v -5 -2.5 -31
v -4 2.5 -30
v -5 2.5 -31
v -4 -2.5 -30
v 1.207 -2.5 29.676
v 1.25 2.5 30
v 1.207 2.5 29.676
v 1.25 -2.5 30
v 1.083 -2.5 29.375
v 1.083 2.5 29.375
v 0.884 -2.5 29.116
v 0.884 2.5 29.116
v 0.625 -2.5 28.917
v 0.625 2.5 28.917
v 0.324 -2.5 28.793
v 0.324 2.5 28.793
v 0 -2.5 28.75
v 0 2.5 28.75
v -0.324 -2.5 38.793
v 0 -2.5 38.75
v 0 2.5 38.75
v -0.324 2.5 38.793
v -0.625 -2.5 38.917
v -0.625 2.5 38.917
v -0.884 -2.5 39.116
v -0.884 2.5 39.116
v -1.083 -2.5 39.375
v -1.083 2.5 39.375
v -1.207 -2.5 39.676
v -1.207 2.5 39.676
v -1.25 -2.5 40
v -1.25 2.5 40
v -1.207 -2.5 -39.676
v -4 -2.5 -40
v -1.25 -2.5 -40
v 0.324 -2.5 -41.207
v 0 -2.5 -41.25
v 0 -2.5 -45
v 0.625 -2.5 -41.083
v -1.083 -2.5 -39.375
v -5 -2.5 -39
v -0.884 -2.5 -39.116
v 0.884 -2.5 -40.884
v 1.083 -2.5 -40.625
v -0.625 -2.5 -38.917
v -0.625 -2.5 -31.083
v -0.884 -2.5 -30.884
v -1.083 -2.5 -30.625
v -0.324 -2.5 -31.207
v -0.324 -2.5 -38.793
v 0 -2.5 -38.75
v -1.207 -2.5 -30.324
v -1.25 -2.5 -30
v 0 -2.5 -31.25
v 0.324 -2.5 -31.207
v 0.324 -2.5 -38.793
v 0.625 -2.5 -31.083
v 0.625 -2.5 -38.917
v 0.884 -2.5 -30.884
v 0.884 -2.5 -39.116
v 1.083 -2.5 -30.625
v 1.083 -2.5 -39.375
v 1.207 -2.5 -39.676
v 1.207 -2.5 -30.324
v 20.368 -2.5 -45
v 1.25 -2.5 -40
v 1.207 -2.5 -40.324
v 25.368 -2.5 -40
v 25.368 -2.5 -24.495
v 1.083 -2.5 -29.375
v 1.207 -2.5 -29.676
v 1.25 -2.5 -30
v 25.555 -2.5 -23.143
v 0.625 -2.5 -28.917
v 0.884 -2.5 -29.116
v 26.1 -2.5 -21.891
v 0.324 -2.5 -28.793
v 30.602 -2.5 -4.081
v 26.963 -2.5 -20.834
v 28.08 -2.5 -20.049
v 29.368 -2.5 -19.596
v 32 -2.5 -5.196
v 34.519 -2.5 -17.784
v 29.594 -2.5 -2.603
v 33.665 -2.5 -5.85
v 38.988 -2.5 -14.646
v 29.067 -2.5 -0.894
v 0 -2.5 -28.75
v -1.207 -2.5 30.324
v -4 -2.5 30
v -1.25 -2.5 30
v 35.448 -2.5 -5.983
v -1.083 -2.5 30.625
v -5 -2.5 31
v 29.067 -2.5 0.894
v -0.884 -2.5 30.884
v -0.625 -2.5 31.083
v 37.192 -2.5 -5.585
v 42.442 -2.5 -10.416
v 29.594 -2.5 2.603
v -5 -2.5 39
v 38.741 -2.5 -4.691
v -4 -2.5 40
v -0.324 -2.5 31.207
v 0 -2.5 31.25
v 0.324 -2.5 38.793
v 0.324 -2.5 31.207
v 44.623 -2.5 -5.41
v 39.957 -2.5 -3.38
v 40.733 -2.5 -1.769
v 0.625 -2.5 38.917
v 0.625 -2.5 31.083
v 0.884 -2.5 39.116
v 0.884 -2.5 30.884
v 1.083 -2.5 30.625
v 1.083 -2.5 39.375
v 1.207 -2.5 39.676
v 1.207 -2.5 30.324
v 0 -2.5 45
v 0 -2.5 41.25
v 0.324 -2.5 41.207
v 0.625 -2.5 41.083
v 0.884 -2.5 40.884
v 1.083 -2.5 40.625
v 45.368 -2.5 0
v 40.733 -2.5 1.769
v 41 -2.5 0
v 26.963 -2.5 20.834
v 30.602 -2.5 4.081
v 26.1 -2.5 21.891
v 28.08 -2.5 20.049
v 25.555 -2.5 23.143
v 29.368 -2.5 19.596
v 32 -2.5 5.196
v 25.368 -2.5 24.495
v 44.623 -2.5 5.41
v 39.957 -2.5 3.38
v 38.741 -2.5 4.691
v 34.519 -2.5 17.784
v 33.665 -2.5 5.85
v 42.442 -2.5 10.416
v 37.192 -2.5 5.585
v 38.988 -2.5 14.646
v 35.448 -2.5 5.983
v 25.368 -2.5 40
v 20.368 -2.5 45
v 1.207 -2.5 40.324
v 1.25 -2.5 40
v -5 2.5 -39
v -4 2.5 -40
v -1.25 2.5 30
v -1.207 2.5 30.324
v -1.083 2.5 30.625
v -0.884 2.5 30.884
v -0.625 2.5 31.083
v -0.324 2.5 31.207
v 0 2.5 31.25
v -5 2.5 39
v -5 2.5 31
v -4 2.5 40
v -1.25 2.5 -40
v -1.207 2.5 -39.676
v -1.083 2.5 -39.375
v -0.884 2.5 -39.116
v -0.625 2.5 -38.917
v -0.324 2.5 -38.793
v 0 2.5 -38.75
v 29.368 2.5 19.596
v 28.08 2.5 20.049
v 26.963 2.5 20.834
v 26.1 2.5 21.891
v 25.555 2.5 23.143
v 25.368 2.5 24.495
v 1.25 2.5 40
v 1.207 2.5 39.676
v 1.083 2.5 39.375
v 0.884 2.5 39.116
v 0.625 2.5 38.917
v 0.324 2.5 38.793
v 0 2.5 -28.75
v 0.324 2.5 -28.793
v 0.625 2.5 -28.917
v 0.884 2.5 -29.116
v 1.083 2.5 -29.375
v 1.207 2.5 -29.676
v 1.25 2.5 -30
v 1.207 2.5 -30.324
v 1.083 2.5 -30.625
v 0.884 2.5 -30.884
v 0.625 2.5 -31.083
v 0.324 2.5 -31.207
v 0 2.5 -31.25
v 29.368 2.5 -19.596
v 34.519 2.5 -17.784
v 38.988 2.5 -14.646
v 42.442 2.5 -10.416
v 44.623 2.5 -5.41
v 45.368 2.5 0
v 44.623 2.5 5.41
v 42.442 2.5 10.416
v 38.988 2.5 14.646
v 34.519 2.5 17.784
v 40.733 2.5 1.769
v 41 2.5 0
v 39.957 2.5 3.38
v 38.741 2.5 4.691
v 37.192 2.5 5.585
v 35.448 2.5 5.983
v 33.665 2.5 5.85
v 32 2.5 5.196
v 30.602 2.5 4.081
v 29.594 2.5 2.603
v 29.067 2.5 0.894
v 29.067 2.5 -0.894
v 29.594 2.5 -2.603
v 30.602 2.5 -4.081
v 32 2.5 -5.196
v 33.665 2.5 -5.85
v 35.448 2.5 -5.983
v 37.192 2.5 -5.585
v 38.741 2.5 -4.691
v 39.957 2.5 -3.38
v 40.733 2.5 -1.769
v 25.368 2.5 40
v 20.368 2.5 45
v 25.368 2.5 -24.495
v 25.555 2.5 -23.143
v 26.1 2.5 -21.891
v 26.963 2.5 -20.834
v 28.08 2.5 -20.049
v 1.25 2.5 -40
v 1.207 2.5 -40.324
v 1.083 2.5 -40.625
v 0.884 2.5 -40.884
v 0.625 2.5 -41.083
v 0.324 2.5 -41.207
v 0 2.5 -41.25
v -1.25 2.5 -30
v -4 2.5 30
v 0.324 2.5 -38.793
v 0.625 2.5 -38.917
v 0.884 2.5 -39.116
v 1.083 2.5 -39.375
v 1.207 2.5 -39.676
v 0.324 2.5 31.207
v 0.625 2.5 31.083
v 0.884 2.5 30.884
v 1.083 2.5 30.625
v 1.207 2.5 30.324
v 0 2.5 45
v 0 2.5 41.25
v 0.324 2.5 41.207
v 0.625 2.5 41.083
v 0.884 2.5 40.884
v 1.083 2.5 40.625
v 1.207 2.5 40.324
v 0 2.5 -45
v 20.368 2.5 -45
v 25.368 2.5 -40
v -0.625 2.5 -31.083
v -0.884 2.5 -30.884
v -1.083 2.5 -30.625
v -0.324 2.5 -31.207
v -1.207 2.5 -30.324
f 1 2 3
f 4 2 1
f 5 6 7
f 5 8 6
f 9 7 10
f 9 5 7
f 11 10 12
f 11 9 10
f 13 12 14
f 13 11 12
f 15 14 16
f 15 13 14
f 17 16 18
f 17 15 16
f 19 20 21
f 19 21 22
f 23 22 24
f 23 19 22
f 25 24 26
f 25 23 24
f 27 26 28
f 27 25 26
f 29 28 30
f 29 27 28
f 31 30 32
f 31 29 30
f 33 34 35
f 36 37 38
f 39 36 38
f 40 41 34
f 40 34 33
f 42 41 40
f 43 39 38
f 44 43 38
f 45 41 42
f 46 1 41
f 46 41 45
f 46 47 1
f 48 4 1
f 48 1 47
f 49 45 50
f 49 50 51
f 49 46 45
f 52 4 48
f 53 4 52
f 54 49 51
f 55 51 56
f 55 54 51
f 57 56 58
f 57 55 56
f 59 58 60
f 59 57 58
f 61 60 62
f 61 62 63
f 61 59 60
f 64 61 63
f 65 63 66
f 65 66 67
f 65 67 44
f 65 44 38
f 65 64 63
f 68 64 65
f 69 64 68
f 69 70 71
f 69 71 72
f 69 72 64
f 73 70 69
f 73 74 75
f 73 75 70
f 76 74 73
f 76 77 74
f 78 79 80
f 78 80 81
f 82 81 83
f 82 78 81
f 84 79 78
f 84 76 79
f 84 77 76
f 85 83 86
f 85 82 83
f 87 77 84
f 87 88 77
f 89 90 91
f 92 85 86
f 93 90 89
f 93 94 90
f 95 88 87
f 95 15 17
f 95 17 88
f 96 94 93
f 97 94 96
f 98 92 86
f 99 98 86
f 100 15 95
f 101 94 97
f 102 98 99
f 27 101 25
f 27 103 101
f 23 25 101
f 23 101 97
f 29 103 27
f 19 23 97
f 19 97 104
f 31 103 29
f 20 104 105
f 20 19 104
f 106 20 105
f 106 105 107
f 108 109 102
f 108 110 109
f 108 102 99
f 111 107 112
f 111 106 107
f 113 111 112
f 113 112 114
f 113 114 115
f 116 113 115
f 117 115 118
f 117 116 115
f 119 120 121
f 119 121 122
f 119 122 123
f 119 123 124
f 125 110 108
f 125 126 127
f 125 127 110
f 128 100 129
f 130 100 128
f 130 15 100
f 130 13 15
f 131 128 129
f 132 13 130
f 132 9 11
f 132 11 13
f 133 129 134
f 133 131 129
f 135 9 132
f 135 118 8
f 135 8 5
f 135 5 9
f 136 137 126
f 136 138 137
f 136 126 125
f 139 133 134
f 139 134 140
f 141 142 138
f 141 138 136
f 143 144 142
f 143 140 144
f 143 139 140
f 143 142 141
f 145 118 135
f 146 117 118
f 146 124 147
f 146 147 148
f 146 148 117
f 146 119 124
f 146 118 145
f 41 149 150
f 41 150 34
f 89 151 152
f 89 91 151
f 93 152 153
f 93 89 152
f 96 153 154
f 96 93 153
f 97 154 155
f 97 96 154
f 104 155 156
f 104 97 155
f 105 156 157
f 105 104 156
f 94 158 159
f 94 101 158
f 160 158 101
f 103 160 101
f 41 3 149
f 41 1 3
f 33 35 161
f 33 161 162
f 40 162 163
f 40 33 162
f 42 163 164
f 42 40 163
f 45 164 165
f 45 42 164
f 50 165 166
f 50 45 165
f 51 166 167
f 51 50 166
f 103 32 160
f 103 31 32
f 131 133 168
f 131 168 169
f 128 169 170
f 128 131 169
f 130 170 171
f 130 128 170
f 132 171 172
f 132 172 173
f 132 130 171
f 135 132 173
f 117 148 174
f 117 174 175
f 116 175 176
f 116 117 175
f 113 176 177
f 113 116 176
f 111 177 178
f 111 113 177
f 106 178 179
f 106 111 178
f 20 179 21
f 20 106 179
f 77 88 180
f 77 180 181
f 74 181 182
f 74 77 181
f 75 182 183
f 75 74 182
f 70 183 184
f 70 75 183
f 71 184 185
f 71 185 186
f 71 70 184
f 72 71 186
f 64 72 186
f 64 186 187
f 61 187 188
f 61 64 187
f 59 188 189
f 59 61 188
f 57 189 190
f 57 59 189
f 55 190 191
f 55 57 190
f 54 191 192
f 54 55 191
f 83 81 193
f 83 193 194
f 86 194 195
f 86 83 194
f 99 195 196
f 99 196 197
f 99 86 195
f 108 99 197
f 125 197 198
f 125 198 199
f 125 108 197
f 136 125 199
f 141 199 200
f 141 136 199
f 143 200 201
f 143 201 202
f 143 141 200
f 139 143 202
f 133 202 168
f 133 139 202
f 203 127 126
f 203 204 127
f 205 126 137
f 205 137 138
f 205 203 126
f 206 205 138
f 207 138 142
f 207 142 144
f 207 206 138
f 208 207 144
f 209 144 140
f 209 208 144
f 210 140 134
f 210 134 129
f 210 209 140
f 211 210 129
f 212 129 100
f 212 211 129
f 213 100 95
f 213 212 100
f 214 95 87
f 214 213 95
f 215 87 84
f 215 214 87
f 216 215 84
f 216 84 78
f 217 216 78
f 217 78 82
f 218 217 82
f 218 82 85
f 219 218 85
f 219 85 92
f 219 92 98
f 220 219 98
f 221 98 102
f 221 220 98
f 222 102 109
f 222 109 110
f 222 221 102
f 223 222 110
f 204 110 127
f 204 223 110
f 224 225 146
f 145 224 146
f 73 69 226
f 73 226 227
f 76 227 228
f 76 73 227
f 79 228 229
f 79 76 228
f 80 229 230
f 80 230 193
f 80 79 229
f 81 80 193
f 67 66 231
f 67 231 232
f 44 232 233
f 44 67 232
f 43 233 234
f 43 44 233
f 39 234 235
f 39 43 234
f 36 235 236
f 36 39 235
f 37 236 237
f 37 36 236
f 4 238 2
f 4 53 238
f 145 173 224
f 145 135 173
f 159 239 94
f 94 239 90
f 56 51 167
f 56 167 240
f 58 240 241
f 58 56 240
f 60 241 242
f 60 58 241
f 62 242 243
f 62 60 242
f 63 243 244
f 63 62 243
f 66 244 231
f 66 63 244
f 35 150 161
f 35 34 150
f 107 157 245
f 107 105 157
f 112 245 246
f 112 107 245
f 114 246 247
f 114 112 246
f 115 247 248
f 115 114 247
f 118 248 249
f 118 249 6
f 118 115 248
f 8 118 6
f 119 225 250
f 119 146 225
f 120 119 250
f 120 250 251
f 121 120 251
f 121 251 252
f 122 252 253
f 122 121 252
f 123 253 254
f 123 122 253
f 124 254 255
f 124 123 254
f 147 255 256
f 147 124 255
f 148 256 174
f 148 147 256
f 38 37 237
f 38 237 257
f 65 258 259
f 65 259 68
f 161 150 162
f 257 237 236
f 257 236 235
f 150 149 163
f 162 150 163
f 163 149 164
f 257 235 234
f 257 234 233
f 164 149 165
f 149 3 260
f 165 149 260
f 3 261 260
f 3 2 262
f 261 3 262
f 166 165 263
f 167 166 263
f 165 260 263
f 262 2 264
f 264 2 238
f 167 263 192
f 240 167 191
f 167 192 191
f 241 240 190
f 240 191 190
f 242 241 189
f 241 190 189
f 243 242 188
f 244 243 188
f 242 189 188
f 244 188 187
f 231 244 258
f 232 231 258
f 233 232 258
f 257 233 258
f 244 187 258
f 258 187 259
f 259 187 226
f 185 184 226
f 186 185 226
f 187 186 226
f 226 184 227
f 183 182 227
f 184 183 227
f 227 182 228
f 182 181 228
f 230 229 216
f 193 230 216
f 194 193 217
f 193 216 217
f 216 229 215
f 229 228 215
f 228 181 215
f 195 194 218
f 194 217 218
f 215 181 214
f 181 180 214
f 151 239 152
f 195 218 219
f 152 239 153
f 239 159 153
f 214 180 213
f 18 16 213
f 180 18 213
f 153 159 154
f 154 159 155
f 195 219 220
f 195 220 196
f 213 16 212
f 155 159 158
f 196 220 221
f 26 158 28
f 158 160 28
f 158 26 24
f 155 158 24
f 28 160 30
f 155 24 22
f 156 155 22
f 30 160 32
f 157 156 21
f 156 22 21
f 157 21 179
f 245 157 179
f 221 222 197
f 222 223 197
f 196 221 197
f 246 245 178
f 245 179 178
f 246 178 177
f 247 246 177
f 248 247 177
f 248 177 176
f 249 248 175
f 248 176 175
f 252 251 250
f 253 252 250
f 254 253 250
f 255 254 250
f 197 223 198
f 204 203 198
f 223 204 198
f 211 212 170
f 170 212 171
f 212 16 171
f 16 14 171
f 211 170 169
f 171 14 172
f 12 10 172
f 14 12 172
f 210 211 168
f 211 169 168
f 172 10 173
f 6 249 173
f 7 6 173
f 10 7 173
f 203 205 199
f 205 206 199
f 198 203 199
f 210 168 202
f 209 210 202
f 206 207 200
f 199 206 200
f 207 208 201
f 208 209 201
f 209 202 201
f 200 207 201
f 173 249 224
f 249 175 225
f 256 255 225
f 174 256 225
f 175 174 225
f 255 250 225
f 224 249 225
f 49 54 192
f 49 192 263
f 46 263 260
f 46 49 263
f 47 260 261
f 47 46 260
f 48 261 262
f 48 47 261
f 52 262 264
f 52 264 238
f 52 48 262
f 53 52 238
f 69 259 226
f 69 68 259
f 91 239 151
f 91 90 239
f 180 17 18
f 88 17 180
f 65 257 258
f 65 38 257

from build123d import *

# Parameters (mm, degrees)
F0_R     = 6
F1_DEPTH = 2.5
F2_SIZE  = 5
F3_SIZE  = 1


with BuildPart() as f1:
    # F0 (on Front) → F1 (new body, symmetric)
    with BuildSketch(Plane.XZ):
        with BuildLine():
            Line((5, 40), (5, 30))
            Line((5, 30), (1.25, 30))
            ThreePointArc((1.25, 30), (0.883883, 29.116117), (0, 28.75))
            Line((0, 28.75), (0, 0))
            Line((0, 0), (0, -28.75))
            ThreePointArc((0, -28.75), (0.883883, -29.116117), (1.25, -30))
            Line((1.25, -30), (5, -30))
            Line((5, -30), (5, -40))
            Line((5, -40), (1.25, -40))
            ThreePointArc((1.25, -40), (0.883883, -40.883883), (0, -41.25))
            Line((0, -41.25), (0, -45))
            Line((0, -45), (25.368266, -45))
            Line((25.368266, -45), (25.368266, -24.494897))
            ThreePointArc((25.368266, -24.494897), (26.495282, -21.33262), (29.368266, -19.595918))
            ThreePointArc((29.368266, -19.595918), (45.368266, 0), (29.368266, 19.595918))
            ThreePointArc((29.368266, 19.595918), (26.495282, 21.33262), (25.368266, 24.494897))
            Line((25.368266, 24.494897), (25.368266, 45))
            Line((25.368266, 45), (0, 45))
            Line((0, 45), (0, 41.25))
            ThreePointArc((0, 41.25), (0.883883, 40.883883), (1.25, 40))
            Line((1.25, 40), (5, 40))
        make_face()
        with Locations((35, 0)):
            Circle(F0_R, mode=Mode.SUBTRACT)
        with BuildLine():
            Line((5, -30), (1.25, -30))
            ThreePointArc((1.25, -30), (0.883883, -30.883883), (0, -31.25))
            Line((0, -31.25), (0, -38.75))
            ThreePointArc((0, -38.75), (0.883883, -39.116117), (1.25, -40))
            Line((1.25, -40), (5, -40))
            Line((5, -40), (5, -30))
        make_face()
        with BuildLine():
            ThreePointArc((0, -31.25), (-0.883883, -30.883883), (-1.25, -30))
            Line((-1.25, -30), (-5, -30))
            Line((-5, -30), (-5, -40))
            Line((-5, -40), (-1.25, -40))
            ThreePointArc((-1.25, -40), (-0.883883, -39.116117), (0, -38.75))
            Line((0, -38.75), (0, -31.25))
        make_face()
        with BuildLine():
            Line((1.25, 30), (5, 30))
            Line((5, 30), (5, 40))
            Line((5, 40), (1.25, 40))
            ThreePointArc((1.25, 40), (0.883883, 39.116117), (0, 38.75))
            Line((0, 38.75), (0, 31.25))
            ThreePointArc((0, 31.25), (0.883883, 30.883883), (1.25, 30))
        make_face()
        with BuildLine():
            ThreePointArc((-1.25, 30), (-0.883883, 30.883883), (0, 31.25))
            Line((0, 31.25), (0, 38.75))
            ThreePointArc((0, 38.75), (-0.883883, 39.116117), (-1.25, 40))
            Line((-1.25, 40), (-5, 40))
            Line((-5, 40), (-5, 30))
            Line((-5, 30), (-1.25, 30))
        make_face()
    extrude(amount=F1_DEPTH, both=True)

    # F2
    f2_edges = [f1.edges().sort_by_distance(p)[0] for p in [
        (25.368266, 0, 45),
        (25.368266, 0, -45),
    ]]
    chamfer(f2_edges, length=F2_SIZE)

    # F3
    f3_edges = [f1.edges().sort_by_distance(p)[0] for p in [
        (-5, 0, 40),
        (-5, 0, -30),
        (-5, 0, 30),
        (-5, 0, -40),
    ]]
    chamfer(f3_edges, length=F3_SIZE)


solid = f1.part
